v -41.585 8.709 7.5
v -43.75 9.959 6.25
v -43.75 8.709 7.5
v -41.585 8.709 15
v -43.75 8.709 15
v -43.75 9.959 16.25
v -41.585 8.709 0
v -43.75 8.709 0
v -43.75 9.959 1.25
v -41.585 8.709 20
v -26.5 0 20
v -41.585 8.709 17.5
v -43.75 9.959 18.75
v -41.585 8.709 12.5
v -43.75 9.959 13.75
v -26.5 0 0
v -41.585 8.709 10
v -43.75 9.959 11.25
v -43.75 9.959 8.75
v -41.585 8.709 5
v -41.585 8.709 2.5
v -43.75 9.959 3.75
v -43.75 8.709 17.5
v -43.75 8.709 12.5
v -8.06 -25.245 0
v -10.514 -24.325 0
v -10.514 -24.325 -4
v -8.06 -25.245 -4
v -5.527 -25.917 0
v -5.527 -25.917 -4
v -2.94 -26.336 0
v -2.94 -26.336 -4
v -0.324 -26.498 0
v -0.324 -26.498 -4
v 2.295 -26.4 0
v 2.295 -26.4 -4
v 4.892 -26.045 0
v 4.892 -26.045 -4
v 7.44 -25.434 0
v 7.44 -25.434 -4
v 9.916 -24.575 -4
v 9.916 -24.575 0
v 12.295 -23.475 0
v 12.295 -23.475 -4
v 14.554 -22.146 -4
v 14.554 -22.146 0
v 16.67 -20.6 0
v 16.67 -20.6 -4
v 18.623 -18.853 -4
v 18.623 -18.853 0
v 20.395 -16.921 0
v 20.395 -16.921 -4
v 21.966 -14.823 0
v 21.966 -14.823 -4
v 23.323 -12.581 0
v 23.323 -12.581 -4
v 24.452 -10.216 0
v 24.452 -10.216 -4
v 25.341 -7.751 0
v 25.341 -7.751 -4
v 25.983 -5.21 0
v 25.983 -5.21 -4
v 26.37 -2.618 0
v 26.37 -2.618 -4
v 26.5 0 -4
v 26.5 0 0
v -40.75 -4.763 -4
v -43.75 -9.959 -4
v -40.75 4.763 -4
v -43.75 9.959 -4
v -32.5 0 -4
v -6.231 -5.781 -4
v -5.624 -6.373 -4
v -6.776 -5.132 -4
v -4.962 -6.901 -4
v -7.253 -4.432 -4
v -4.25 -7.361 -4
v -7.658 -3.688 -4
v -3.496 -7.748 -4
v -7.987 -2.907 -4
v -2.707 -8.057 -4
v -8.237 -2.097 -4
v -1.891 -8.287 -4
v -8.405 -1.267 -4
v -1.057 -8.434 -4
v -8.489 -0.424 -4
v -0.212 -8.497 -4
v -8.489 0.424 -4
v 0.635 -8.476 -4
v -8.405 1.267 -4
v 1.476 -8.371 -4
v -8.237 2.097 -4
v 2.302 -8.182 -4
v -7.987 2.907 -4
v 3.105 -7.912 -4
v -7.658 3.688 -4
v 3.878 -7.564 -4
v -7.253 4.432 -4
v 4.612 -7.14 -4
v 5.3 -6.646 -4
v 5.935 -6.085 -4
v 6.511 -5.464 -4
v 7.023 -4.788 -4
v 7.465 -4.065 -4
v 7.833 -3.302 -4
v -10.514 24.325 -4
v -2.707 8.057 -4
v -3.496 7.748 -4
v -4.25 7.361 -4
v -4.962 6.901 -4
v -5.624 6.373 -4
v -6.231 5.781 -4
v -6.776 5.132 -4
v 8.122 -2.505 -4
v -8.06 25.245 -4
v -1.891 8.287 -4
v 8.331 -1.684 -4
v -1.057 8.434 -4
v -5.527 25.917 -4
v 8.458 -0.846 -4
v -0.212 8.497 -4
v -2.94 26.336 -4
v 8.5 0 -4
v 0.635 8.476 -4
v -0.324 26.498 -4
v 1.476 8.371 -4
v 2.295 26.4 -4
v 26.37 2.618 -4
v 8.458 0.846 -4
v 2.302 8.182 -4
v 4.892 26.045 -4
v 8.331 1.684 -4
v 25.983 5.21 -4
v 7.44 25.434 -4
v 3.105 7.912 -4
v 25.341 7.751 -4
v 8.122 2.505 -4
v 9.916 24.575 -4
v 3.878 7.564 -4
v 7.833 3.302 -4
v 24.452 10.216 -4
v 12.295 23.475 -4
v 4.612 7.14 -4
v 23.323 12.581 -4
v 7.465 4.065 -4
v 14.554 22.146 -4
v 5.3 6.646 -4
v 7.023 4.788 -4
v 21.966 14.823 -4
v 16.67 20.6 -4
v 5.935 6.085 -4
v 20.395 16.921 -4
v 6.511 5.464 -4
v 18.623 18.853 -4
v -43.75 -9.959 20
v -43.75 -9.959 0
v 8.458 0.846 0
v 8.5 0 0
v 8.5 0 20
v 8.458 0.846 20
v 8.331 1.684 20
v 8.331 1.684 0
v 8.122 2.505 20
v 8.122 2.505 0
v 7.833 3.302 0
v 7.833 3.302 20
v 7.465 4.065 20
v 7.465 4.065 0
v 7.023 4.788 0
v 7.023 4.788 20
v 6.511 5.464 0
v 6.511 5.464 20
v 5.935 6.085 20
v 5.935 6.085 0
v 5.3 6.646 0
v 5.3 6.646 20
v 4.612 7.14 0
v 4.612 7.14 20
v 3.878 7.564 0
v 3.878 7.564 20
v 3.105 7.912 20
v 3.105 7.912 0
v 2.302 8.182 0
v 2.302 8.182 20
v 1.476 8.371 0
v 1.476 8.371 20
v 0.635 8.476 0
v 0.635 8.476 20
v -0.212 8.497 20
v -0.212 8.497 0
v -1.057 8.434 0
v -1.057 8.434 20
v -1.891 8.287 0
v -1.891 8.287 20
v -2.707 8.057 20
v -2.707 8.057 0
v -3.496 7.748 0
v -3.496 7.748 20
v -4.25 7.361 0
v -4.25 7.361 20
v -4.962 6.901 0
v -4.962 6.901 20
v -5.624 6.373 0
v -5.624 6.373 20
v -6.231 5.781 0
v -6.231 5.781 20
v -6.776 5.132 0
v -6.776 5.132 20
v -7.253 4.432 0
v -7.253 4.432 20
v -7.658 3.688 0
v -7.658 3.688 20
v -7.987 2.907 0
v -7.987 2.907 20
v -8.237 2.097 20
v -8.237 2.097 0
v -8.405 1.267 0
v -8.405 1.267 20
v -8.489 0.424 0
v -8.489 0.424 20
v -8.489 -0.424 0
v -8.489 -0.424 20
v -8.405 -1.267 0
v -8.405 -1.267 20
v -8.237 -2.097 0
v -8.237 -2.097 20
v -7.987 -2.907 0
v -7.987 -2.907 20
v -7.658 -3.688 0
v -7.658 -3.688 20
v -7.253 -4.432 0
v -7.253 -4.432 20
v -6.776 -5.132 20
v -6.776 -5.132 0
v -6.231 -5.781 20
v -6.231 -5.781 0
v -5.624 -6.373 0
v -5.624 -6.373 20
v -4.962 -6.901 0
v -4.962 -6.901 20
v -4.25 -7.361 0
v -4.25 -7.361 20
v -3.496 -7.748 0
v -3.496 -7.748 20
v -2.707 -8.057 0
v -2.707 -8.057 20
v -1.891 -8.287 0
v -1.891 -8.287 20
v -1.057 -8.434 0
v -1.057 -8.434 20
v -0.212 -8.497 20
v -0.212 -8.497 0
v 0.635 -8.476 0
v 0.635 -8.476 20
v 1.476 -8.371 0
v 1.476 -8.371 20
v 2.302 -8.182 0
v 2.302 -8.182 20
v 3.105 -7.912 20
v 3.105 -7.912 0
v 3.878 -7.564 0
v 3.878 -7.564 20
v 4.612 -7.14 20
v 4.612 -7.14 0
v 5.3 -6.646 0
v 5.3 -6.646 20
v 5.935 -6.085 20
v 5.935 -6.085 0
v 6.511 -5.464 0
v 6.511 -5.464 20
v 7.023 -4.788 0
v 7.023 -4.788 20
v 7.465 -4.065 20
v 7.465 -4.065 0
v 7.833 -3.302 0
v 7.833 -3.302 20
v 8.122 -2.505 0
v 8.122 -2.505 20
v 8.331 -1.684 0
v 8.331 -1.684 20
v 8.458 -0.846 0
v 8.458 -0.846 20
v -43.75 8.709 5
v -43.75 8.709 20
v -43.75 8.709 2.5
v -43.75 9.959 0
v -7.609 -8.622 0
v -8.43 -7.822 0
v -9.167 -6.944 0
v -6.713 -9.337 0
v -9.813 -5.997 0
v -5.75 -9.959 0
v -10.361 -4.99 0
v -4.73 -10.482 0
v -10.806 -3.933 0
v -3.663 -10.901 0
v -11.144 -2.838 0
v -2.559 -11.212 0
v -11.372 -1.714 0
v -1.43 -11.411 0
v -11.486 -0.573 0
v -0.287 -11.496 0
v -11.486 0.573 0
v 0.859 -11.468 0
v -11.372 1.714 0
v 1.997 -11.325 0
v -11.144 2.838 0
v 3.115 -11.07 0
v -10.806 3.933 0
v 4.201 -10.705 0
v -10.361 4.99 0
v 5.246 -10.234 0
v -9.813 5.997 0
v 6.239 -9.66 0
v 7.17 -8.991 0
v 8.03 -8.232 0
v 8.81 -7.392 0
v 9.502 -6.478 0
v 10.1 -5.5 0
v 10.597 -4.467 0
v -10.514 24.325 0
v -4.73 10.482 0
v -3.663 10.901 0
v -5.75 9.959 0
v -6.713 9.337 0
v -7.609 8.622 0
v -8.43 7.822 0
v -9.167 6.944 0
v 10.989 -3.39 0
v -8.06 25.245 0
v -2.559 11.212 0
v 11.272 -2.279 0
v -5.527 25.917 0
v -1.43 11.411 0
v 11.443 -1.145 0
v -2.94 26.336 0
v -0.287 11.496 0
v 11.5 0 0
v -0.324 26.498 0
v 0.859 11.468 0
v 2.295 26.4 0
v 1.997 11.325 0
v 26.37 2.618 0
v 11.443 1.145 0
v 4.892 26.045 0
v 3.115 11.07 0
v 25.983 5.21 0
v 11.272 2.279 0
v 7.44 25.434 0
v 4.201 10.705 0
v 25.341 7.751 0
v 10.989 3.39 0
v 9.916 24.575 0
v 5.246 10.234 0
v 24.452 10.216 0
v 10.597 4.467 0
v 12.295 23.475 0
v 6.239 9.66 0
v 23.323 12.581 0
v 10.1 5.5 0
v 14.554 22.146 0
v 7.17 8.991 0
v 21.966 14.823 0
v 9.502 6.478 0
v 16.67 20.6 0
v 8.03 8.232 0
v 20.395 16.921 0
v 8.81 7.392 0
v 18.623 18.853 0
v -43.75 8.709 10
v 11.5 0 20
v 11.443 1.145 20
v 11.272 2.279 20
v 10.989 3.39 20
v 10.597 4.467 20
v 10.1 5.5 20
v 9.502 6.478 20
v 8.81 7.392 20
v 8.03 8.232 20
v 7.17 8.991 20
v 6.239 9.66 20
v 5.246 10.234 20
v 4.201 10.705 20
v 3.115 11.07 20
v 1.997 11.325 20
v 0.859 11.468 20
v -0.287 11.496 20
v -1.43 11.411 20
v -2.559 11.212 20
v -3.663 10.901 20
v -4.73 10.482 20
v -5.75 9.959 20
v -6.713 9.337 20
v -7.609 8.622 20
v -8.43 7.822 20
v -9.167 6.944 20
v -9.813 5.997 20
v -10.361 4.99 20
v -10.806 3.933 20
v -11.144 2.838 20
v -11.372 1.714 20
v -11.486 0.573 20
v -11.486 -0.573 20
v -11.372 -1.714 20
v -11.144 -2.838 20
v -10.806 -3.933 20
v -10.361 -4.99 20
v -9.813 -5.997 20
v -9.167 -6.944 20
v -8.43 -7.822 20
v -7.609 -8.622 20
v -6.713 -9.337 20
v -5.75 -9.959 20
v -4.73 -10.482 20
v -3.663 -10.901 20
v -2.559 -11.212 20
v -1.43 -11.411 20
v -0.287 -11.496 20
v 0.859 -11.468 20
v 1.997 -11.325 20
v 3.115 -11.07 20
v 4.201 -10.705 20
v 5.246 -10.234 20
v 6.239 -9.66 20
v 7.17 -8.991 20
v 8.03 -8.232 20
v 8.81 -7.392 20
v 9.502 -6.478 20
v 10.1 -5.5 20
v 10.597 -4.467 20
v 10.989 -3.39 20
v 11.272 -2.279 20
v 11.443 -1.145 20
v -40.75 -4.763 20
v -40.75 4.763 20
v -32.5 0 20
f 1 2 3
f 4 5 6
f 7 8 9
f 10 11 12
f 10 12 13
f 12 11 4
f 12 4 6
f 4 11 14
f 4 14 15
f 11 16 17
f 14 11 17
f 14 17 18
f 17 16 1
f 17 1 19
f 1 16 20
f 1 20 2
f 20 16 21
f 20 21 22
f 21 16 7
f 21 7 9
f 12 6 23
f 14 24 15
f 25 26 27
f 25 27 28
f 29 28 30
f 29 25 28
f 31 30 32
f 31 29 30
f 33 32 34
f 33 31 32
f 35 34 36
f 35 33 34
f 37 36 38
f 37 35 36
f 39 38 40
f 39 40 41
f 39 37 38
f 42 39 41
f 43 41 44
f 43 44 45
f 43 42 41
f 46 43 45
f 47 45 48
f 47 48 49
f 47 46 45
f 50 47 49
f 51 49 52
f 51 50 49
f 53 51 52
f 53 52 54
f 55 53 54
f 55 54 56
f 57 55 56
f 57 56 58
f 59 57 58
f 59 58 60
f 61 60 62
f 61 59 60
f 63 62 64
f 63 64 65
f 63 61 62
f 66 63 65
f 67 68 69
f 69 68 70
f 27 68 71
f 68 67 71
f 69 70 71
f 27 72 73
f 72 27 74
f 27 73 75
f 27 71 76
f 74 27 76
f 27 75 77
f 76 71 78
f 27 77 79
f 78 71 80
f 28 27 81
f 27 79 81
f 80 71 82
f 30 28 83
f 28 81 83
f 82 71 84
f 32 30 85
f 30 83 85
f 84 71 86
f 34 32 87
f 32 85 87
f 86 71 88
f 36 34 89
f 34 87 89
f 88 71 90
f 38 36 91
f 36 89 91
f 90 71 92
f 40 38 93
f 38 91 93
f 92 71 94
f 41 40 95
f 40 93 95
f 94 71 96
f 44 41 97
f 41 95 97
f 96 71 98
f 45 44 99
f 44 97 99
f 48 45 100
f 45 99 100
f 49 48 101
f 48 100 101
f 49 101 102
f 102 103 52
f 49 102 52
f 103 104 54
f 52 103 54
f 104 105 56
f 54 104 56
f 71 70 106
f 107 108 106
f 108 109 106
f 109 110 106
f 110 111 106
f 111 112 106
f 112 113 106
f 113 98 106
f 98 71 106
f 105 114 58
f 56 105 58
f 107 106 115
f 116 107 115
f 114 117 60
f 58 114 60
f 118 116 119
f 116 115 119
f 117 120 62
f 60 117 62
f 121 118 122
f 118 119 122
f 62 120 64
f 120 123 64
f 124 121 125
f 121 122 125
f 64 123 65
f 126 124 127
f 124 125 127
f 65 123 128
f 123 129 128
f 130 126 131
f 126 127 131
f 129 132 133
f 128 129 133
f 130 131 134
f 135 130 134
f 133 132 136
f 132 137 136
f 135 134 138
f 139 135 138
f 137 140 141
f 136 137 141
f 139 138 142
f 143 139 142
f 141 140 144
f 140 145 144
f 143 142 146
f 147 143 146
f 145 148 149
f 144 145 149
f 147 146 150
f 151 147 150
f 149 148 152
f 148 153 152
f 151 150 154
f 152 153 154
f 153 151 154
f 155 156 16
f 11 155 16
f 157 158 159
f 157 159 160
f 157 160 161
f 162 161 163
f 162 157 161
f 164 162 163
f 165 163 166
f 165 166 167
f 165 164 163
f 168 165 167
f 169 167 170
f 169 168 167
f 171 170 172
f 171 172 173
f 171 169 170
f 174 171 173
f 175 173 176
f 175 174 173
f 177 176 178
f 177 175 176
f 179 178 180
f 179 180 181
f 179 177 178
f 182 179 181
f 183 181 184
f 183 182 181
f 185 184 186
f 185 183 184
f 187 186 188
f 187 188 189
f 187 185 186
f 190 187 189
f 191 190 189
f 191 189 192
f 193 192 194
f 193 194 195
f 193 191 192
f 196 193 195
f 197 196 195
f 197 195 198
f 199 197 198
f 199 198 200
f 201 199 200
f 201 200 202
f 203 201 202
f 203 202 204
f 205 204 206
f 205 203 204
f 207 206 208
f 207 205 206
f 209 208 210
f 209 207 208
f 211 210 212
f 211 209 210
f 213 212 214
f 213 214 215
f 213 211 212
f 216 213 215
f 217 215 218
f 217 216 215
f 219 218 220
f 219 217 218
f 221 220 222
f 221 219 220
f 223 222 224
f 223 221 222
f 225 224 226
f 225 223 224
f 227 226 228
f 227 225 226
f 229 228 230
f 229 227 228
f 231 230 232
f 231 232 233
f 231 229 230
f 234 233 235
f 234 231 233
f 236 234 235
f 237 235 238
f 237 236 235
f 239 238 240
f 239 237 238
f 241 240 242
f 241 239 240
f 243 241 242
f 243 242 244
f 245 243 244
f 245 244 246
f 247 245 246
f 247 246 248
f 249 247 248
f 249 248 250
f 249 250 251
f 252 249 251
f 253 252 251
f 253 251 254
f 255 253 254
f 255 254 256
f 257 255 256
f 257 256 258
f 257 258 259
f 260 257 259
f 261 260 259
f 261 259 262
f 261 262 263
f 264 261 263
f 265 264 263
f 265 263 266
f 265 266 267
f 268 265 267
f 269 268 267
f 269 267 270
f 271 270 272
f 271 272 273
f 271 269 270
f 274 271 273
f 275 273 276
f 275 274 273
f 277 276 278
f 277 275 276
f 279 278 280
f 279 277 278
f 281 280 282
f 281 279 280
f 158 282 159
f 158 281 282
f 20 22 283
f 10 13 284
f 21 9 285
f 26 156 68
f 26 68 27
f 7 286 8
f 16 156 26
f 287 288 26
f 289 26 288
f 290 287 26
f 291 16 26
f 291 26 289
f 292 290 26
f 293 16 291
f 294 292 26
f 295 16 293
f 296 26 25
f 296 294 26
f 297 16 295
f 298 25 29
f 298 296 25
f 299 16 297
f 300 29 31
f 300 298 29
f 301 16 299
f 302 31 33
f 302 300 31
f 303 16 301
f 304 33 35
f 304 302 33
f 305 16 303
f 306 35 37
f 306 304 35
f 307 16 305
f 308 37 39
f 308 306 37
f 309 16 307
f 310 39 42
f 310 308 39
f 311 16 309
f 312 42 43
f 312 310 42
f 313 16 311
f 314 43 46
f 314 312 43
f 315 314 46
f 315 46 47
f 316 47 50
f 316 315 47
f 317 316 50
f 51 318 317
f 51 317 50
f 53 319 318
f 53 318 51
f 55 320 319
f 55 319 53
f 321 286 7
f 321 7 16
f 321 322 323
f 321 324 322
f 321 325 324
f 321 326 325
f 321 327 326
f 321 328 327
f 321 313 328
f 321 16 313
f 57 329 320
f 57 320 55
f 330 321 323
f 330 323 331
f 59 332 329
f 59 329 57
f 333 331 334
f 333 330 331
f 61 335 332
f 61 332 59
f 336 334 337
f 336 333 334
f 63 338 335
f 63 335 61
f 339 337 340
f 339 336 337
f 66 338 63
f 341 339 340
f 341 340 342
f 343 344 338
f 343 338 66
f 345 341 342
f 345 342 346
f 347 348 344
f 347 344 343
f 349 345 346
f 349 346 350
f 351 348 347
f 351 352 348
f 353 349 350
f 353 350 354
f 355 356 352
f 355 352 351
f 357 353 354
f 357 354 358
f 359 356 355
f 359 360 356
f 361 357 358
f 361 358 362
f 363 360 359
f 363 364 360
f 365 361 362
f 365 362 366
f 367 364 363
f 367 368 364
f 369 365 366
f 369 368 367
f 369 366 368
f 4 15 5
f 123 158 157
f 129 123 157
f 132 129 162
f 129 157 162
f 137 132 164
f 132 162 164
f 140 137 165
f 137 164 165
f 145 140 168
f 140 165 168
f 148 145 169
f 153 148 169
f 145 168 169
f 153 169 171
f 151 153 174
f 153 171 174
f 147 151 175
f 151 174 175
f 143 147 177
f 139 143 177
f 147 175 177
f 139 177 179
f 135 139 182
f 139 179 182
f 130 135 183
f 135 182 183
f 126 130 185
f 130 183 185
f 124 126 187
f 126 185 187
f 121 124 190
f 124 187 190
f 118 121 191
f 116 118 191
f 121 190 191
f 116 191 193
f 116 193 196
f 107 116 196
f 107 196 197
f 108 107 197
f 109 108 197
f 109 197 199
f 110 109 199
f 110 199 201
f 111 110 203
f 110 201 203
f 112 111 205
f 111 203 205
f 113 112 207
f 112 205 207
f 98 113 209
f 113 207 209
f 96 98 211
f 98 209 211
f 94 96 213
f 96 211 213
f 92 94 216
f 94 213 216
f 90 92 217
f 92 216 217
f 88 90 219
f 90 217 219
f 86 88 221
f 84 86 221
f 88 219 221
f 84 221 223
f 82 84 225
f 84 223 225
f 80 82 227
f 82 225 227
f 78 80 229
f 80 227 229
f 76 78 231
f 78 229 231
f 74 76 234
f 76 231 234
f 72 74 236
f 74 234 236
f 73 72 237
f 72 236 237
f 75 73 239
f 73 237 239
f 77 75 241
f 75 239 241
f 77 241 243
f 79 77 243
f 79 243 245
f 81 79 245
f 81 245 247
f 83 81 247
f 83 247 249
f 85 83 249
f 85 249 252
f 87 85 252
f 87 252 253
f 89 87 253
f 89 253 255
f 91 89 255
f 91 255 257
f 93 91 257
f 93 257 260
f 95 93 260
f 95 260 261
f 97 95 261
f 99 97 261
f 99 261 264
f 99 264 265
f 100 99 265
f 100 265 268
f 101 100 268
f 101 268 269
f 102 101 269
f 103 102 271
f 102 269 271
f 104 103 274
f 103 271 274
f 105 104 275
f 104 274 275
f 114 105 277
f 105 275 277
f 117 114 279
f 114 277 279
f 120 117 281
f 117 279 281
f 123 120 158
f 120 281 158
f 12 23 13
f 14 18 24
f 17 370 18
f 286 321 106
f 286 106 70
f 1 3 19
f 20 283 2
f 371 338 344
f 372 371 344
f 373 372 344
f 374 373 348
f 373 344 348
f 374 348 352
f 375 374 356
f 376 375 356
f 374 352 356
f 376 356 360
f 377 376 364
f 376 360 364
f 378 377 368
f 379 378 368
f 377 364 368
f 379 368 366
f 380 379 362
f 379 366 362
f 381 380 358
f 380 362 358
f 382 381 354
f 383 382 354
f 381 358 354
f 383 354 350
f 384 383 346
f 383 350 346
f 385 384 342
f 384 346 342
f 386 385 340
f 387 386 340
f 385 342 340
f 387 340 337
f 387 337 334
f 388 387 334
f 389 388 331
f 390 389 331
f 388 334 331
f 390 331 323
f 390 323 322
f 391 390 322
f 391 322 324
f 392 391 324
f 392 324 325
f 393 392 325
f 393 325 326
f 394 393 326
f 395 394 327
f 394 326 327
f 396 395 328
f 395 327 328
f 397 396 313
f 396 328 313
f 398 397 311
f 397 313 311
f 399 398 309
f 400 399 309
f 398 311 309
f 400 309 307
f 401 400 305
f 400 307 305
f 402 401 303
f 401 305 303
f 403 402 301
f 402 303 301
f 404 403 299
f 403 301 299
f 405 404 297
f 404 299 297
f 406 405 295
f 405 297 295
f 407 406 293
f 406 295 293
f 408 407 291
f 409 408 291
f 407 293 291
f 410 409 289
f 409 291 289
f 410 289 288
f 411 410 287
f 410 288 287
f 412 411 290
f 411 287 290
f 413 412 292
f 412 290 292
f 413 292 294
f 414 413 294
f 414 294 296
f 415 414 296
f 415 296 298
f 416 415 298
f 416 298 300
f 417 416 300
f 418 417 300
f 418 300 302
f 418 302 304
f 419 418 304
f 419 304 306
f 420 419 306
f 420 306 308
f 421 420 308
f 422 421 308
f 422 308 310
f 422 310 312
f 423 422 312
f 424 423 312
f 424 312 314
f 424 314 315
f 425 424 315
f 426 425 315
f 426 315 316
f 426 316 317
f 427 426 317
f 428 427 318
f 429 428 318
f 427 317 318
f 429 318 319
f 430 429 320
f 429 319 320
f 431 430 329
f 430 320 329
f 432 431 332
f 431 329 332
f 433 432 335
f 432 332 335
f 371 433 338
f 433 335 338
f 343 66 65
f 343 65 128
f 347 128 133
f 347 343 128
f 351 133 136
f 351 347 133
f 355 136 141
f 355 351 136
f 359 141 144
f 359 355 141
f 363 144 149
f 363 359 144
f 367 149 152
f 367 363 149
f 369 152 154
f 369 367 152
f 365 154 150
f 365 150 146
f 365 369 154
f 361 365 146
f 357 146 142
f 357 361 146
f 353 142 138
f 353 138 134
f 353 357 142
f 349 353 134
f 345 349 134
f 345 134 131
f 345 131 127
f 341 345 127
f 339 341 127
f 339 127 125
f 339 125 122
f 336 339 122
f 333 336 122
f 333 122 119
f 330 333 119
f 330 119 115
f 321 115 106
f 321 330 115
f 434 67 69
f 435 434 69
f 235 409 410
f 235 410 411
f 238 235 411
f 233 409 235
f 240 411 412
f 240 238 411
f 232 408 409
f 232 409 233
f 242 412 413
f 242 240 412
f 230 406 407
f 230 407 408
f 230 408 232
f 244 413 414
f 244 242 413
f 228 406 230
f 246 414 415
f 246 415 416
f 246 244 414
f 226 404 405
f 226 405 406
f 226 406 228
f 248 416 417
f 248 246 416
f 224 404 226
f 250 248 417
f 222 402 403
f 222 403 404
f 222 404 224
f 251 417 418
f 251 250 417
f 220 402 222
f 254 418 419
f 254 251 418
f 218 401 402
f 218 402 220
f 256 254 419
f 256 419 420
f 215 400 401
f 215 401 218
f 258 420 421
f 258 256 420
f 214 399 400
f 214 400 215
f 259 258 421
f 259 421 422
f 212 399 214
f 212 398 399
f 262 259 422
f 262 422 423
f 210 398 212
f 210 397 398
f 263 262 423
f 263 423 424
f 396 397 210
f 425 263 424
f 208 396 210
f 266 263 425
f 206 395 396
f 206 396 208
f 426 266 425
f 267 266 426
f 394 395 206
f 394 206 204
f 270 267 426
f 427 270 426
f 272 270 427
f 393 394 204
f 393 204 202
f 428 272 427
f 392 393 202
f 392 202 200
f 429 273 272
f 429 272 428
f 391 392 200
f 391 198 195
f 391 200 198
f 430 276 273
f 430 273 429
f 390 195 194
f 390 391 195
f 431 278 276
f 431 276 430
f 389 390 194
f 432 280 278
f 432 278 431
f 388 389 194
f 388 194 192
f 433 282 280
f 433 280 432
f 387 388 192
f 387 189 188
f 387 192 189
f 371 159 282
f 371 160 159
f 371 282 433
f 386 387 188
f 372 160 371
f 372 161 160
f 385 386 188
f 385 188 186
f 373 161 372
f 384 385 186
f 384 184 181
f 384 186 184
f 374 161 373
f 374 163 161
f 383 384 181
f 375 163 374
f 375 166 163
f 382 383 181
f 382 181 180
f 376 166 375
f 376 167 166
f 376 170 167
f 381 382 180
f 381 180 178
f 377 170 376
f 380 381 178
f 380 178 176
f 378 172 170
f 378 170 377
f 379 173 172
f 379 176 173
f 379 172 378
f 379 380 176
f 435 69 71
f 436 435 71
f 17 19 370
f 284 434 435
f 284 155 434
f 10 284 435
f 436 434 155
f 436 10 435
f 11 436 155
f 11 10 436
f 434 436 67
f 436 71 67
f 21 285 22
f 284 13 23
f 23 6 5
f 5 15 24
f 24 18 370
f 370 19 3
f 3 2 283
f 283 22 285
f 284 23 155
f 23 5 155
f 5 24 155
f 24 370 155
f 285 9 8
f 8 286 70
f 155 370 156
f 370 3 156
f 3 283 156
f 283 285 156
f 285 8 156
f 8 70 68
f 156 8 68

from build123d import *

# Parameters (mm, degrees)
F0_R     = 11.5
F0_R_2   = 8.5
F1_DEPTH = 4
F2_DEPTH = 20
F4_DEPTH = 10


# Not quite as in the source:
# - a feature names something its author has since deleted; it is built from what else it names


with BuildPart() as f1:
    # F0 (on Top) → F1 (new body)
    with BuildSketch(Plane.XY):
        Polygon((-43.75, -9.9592921435), (-26.5, 0), (-43.75, 9.9592921435), align=None)
        Polygon((-32.5, 0), (-40.75, -4.7631397208), (-40.75, 4.7631397208), align=None, mode=Mode.SUBTRACT)
        with BuildLine():
            Line((-43.75, 9.9592921435), (-26.5, 0))
            ThreePointArc((-26.5, 0), (-22.1457987188, 14.5538173379), (-10.514067992, 24.324974291))
            Line((-10.514067992, 24.324974291), (-43.75, 9.9592921435))
        make_face()
        with BuildLine():
            ThreePointArc((-10.514067992, 24.324974291), (-22.1457987188, 14.5538173379), (-26.5, 0))
            ThreePointArc((-26.5, 0), (-22.1457987188, -14.5538173379), (-10.514067992, -24.324974291))
            ThreePointArc((-10.514067992, -24.324974291), (14.5538173379, -22.1457987188), (26.5, 0))
            ThreePointArc((26.5, 0), (14.5538173379, 22.1457987188), (-10.514067992, 24.324974291))
        make_face()
        Circle(F0_R, mode=Mode.SUBTRACT)
        Circle(F0_R)
        Circle(F0_R_2, mode=Mode.SUBTRACT)
        with BuildLine():
            ThreePointArc((-10.514067992, -24.324974291), (-22.1457987188, -14.5538173379), (-26.5, 0))
            Line((-26.5, 0), (-43.75, -9.9592921435))
            Line((-43.75, -9.9592921435), (-10.514067992, -24.324974291))
        make_face()
    extrude(amount=-F1_DEPTH)

    # F0 (on Top) → F2 (join)
    with BuildSketch(Plane.XY):
        Polygon((-43.75, -9.9592921435), (-26.5, 0), (-43.75, 9.9592921435), align=None)
        Polygon((-32.5, 0), (-40.75, -4.7631397208), (-40.75, 4.7631397208), align=None, mode=Mode.SUBTRACT)
        Circle(F0_R)
        Circle(F0_R_2, mode=Mode.SUBTRACT)
    extrude(amount=F2_DEPTH)

    # F3 (on face) → F4 (cut)
    with BuildSketch(Plane(origin=(-43.75, 0, 0), x_dir=(0, -1, 0), z_dir=(-1, 0, 0))):
        Polygon((-9.9592921435, 1.25), (-9.9592921435, 0), (-8.7092921435, 0), align=None)
        Polygon((-9.9592921435, 3.75), (-9.9592921435, 1.25), (-8.7092921435, 2.5), align=None)
        Polygon((-8.7092921435, 5), (-9.9592921435, 6.25), (-9.9592921435, 3.75), align=None)
        Polygon((-8.7092921435, 7.5), (-9.9592921435, 8.75), (-9.9592921435, 6.25), align=None)
        Polygon((-8.7092921435, 10), (-9.9592921435, 11.25), (-9.9592921435, 8.75), align=None)
        Polygon((-8.7092921435, 12.5), (-9.9592921435, 13.75), (-9.9592921435, 11.25), align=None)
        Polygon((-8.7092921435, 15), (-9.9592921435, 16.25), (-9.9592921435, 13.75), align=None)
        Polygon((-8.7092921435, 17.5), (-9.9592921435, 18.75), (-9.9592921435, 16.25), align=None)
        Polygon((-9.9592921435, 18.75), (-8.7092921435, 20), (-9.9592921435, 20), align=None)
    extrude(amount=-F4_DEPTH, mode=Mode.SUBTRACT)


solid = f1.part
